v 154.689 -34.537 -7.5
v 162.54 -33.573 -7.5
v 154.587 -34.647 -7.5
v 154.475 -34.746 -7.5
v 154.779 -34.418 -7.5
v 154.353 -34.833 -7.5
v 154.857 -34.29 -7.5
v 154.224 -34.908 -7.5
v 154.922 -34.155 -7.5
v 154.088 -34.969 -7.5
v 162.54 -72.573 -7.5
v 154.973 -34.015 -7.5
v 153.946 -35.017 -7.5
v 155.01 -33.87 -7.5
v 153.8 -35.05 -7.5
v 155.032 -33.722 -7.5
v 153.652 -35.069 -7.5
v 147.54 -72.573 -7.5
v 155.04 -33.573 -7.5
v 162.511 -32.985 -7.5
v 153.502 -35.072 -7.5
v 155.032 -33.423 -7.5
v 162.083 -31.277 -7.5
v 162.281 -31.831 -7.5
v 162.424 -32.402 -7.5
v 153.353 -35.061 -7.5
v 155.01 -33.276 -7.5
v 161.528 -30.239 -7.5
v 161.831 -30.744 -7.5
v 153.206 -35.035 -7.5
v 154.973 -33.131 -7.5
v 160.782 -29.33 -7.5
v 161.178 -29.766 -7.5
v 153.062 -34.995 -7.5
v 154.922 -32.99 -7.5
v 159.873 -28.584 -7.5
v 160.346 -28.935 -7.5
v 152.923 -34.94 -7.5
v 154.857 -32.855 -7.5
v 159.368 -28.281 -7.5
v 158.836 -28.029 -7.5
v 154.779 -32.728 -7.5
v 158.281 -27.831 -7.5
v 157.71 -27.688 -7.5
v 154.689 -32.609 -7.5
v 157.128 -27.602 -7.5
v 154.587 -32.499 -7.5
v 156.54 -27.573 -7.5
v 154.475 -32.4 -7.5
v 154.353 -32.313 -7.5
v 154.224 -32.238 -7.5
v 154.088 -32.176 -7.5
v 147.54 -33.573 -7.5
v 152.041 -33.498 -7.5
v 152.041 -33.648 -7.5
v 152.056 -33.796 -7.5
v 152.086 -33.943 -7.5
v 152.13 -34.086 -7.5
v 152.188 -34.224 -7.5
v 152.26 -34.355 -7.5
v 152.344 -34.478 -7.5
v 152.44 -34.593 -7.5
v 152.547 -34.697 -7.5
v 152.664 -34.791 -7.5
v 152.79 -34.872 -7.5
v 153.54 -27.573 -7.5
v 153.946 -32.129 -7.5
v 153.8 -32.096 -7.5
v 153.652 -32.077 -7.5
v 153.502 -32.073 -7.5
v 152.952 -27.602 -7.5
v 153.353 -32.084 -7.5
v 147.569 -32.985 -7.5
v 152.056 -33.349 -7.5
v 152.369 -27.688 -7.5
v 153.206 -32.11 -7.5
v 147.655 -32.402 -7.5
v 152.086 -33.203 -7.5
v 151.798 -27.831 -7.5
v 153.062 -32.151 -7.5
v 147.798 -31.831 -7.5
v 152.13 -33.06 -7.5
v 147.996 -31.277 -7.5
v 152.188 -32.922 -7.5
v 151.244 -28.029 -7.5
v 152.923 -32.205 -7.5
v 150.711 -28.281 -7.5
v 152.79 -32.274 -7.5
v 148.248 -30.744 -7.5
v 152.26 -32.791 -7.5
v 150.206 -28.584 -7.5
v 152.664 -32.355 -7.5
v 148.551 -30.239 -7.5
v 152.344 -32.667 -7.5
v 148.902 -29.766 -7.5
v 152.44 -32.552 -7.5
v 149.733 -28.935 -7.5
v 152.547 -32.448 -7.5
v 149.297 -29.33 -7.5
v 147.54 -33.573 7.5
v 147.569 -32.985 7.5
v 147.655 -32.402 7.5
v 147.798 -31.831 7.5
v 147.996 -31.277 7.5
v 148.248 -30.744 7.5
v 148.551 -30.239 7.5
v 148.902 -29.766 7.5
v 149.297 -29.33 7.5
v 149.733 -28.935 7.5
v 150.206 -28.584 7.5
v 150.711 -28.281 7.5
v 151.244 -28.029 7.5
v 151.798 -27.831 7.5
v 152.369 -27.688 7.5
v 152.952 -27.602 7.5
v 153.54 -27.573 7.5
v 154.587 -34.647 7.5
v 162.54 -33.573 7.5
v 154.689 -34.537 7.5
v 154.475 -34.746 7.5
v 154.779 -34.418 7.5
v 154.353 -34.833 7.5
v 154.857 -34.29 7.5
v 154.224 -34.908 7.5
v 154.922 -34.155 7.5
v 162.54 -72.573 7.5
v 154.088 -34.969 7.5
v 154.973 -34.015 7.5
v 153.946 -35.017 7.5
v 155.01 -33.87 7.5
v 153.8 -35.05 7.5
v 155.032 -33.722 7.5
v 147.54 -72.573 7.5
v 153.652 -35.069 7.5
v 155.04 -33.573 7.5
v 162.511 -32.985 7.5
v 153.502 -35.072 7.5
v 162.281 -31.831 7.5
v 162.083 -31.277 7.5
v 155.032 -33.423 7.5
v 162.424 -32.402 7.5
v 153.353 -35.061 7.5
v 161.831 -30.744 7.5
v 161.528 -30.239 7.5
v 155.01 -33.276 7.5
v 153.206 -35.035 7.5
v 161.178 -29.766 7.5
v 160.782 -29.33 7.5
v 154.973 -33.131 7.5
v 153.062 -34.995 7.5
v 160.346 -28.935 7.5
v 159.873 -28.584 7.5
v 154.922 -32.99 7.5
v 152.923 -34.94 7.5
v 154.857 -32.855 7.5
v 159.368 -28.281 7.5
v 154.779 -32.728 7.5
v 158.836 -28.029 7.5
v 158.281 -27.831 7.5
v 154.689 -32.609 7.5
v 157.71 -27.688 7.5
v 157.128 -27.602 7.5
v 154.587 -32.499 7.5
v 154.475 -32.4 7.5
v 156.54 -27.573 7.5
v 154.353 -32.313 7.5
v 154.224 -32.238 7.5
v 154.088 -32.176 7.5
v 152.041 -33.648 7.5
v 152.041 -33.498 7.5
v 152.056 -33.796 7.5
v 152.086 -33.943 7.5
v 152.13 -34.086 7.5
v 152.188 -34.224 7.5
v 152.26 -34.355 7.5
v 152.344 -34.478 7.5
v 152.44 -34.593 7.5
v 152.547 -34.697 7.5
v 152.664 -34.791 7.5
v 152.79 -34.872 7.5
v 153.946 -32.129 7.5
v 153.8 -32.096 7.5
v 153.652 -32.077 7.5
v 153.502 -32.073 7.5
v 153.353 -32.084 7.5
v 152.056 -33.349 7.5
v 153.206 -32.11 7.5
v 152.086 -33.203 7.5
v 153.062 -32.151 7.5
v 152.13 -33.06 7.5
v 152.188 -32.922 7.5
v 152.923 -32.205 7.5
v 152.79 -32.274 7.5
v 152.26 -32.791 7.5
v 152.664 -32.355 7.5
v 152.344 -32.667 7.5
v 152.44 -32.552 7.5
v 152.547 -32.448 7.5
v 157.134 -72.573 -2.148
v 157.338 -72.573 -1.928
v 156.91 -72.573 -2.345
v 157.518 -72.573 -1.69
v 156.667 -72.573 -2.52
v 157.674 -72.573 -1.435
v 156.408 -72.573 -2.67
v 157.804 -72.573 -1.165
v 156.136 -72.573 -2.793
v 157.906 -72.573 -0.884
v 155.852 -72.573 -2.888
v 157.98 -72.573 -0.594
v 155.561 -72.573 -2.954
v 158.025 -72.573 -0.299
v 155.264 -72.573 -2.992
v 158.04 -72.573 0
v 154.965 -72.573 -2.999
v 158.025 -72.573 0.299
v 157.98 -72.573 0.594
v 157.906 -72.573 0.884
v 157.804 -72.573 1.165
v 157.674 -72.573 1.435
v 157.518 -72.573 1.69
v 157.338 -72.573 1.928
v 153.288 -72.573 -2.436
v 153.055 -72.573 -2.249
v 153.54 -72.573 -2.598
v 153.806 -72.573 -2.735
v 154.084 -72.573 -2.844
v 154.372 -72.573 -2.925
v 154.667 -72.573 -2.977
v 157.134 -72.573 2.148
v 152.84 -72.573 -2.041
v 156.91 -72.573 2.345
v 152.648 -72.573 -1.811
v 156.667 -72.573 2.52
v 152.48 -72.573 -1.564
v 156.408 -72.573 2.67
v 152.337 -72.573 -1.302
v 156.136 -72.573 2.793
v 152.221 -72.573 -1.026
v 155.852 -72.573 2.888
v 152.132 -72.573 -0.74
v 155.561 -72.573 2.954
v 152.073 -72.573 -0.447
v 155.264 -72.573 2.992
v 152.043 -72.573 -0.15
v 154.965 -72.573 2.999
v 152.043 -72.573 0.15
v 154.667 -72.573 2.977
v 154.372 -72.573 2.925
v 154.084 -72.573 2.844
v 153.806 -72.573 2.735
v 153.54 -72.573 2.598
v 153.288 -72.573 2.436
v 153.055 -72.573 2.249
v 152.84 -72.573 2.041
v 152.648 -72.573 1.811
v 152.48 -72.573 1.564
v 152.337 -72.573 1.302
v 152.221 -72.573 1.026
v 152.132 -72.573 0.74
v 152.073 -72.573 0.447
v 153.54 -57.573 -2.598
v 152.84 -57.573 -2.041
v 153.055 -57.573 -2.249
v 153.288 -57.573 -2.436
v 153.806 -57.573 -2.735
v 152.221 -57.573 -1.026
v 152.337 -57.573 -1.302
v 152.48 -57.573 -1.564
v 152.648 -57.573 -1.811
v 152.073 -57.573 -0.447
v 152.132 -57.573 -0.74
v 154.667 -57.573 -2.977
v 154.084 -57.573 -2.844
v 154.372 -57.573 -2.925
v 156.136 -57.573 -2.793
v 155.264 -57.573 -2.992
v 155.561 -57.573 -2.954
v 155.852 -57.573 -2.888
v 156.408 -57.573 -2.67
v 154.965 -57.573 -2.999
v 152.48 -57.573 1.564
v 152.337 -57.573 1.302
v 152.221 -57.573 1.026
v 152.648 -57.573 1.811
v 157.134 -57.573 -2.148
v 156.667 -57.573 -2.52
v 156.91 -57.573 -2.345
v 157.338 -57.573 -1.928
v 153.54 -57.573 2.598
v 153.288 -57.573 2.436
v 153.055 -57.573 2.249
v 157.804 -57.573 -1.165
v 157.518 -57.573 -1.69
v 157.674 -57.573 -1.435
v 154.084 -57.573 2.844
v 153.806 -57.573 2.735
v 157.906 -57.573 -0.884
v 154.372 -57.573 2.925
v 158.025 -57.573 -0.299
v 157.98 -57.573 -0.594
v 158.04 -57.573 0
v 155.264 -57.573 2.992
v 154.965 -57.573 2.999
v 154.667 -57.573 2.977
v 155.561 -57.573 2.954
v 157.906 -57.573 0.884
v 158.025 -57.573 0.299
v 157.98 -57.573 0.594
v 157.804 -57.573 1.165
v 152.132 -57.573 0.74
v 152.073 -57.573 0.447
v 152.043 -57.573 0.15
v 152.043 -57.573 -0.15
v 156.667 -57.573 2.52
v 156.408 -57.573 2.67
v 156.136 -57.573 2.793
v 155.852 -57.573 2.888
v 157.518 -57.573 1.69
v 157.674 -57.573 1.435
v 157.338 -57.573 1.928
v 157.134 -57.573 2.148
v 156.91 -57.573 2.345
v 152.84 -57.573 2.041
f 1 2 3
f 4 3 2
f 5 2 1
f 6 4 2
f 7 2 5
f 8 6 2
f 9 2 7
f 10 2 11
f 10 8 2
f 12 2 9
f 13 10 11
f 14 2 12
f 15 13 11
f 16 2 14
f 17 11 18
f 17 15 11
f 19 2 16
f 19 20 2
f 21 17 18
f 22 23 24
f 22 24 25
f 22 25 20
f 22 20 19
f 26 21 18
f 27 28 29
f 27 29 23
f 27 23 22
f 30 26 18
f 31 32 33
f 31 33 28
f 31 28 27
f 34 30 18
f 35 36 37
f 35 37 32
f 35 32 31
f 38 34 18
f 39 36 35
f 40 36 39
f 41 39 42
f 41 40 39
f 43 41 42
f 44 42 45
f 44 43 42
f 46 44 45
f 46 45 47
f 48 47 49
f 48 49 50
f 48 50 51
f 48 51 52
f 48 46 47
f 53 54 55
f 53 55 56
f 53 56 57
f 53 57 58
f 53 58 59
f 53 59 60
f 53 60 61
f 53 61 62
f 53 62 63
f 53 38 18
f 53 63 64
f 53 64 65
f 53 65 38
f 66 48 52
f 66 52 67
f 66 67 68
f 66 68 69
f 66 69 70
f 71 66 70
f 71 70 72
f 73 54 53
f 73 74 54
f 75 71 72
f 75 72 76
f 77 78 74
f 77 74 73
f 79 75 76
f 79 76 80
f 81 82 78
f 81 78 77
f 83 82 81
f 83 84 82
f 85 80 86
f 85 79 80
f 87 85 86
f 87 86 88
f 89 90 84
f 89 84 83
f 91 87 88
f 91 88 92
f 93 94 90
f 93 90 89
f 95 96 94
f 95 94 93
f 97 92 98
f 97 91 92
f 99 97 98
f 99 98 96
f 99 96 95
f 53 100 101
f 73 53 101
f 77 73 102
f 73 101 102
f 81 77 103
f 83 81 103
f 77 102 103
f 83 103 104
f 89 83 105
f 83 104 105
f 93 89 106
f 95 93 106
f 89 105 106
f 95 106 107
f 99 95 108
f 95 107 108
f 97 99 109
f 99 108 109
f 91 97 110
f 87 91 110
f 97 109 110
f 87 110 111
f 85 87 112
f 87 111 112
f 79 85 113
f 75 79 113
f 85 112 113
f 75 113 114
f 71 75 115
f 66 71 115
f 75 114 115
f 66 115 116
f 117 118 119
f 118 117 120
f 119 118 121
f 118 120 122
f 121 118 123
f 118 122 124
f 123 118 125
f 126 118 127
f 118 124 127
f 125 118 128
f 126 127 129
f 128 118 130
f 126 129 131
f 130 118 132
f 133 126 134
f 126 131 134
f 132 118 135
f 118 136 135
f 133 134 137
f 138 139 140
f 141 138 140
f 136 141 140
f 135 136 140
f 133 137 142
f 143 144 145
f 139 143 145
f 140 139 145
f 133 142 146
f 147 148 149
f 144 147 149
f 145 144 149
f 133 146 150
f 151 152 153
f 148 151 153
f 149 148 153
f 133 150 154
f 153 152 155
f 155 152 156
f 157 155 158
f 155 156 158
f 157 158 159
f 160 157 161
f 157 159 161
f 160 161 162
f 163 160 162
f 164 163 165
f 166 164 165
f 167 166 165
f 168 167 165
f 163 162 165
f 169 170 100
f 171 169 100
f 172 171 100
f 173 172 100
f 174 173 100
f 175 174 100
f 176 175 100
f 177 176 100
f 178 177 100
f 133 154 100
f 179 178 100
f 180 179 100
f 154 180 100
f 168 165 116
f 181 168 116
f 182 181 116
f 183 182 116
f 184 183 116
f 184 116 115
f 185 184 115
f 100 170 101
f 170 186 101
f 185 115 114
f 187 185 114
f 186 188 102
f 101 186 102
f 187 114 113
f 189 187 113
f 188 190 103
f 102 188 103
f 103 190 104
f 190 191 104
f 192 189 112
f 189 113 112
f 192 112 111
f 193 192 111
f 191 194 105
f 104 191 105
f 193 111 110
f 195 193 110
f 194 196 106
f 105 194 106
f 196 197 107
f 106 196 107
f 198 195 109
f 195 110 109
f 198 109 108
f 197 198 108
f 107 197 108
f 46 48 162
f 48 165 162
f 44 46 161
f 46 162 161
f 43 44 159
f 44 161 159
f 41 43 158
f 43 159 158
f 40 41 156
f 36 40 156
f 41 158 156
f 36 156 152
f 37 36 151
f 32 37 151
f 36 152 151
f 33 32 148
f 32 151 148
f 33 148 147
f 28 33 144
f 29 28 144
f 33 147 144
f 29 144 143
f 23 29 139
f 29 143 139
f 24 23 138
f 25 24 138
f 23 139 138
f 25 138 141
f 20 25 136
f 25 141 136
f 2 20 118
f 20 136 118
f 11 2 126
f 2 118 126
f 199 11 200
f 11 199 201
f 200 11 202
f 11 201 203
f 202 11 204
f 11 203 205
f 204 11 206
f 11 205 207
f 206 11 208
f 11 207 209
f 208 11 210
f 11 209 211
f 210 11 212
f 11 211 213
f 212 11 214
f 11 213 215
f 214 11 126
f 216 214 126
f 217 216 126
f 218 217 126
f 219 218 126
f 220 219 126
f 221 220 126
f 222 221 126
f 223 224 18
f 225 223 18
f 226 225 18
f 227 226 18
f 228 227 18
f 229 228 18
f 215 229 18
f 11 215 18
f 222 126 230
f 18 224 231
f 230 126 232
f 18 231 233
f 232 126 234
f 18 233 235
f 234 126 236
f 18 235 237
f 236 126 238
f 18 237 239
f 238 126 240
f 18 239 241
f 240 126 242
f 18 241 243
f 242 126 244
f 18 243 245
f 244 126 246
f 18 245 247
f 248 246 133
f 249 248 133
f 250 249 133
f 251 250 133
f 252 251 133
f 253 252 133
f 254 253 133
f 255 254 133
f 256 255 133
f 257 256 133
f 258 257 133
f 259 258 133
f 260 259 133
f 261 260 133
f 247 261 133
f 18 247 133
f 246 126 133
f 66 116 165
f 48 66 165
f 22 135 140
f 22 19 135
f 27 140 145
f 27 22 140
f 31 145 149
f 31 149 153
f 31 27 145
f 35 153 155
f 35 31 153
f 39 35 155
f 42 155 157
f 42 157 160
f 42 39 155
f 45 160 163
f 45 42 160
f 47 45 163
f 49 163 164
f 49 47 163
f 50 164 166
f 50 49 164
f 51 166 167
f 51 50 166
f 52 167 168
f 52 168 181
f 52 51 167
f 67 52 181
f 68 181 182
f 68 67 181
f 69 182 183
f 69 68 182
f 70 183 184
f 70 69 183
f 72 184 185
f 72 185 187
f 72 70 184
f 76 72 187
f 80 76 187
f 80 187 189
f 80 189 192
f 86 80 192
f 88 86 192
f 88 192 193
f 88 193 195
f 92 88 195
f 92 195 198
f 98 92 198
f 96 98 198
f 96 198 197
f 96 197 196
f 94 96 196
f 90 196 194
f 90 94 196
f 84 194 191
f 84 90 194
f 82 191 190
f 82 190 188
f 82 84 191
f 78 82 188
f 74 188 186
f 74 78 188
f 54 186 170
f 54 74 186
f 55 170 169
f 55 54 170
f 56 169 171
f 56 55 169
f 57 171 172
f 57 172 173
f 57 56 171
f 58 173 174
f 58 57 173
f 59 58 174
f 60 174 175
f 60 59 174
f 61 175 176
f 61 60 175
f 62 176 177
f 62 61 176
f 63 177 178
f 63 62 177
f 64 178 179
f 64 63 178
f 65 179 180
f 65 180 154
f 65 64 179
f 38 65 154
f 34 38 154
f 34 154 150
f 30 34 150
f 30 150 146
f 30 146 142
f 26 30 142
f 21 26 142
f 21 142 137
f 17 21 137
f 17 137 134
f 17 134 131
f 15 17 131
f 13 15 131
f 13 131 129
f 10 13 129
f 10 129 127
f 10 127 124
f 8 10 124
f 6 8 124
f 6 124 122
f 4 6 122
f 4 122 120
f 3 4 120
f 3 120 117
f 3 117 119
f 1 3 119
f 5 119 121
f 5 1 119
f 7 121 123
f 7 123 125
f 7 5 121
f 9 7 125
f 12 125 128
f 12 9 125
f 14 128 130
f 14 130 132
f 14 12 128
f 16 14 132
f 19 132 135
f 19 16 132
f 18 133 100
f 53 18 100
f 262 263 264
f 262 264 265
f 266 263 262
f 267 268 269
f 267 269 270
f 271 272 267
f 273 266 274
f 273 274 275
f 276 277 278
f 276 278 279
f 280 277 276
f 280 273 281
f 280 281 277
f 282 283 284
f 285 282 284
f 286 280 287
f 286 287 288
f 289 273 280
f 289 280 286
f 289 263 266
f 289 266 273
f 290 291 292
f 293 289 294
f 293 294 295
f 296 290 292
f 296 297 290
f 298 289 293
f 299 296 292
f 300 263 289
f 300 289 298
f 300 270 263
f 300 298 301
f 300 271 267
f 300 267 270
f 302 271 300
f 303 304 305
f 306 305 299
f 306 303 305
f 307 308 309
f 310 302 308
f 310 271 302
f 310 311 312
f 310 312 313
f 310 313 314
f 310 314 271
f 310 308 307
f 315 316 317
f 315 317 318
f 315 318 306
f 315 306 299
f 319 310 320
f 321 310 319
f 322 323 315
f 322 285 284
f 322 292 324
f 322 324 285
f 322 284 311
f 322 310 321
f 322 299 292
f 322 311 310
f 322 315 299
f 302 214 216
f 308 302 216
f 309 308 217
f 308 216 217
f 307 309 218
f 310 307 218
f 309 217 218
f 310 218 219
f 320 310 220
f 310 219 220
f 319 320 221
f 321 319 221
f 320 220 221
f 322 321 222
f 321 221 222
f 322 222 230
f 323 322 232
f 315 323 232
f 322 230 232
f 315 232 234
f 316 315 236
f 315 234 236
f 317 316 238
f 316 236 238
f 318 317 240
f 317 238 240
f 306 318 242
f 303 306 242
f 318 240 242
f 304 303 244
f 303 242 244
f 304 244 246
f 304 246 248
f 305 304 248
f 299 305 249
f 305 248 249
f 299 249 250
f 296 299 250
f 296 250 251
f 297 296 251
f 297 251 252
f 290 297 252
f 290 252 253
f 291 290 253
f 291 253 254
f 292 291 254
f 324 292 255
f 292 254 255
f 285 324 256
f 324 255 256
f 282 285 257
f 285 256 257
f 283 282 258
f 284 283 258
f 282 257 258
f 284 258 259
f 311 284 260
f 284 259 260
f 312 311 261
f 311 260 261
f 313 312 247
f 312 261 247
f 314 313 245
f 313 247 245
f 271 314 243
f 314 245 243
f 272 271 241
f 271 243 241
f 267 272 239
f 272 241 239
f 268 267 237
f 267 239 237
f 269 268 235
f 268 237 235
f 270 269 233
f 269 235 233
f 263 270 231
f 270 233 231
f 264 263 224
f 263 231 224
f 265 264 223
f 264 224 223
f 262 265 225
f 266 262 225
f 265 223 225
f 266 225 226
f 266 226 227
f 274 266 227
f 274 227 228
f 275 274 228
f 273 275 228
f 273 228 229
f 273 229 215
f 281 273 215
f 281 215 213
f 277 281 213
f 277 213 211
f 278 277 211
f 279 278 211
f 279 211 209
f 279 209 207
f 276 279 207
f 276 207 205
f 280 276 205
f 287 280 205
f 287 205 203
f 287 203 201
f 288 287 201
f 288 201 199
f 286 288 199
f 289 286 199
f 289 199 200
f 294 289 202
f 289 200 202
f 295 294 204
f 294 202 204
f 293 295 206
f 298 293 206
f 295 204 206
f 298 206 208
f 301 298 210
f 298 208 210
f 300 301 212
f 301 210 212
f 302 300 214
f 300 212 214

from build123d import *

# Parameters (mm, degrees)
SKETCH1_R           = 5
BOSS_EXTRUDE1_DEPTH = 25
SKETCH2_R           = 10
CUT_EXTRUDE1_DEPTH  = 50
SCALE1_SCALE        = 0.3


with BuildPart() as part:
    # Sketch1 → Boss-Extrude1 (new body, symmetric)
    with BuildSketch(Plane.XY):
        with BuildLine():
            Line((150, 25), (160, 25))
            ThreePointArc((160, 25), (174.142135624, 19.142135624), (180, 5))
            Line((180, 5), (180, -125))
            Line((180, -125), (130, -125))
            Line((130, -125), (130, 5))
            ThreePointArc((130, 5), (135.857864376, 19.142135624), (150, 25))
        make_face()
        with Locations((150, 5)):
            Circle(SKETCH1_R, mode=Mode.SUBTRACT)
    extrude(amount=BOSS_EXTRUDE1_DEPTH, both=True)

    # Sketch2 → Cut-Extrude1 (cut)
    with BuildSketch(Plane.XZ.offset(125)):
        with Locations((155, 0)):
            Circle(SKETCH2_R)
    extrude(amount=-CUT_EXTRUDE1_DEPTH, mode=Mode.SUBTRACT)


with BuildPart() as part_1:
    # Scale1: scaled about (155.056620621, -50.103937956, 0)
    add(part.part.scale(SCALE1_SCALE).moved(Location((108.539634435, -35.072756569, 0))))


solid = part_1.part
